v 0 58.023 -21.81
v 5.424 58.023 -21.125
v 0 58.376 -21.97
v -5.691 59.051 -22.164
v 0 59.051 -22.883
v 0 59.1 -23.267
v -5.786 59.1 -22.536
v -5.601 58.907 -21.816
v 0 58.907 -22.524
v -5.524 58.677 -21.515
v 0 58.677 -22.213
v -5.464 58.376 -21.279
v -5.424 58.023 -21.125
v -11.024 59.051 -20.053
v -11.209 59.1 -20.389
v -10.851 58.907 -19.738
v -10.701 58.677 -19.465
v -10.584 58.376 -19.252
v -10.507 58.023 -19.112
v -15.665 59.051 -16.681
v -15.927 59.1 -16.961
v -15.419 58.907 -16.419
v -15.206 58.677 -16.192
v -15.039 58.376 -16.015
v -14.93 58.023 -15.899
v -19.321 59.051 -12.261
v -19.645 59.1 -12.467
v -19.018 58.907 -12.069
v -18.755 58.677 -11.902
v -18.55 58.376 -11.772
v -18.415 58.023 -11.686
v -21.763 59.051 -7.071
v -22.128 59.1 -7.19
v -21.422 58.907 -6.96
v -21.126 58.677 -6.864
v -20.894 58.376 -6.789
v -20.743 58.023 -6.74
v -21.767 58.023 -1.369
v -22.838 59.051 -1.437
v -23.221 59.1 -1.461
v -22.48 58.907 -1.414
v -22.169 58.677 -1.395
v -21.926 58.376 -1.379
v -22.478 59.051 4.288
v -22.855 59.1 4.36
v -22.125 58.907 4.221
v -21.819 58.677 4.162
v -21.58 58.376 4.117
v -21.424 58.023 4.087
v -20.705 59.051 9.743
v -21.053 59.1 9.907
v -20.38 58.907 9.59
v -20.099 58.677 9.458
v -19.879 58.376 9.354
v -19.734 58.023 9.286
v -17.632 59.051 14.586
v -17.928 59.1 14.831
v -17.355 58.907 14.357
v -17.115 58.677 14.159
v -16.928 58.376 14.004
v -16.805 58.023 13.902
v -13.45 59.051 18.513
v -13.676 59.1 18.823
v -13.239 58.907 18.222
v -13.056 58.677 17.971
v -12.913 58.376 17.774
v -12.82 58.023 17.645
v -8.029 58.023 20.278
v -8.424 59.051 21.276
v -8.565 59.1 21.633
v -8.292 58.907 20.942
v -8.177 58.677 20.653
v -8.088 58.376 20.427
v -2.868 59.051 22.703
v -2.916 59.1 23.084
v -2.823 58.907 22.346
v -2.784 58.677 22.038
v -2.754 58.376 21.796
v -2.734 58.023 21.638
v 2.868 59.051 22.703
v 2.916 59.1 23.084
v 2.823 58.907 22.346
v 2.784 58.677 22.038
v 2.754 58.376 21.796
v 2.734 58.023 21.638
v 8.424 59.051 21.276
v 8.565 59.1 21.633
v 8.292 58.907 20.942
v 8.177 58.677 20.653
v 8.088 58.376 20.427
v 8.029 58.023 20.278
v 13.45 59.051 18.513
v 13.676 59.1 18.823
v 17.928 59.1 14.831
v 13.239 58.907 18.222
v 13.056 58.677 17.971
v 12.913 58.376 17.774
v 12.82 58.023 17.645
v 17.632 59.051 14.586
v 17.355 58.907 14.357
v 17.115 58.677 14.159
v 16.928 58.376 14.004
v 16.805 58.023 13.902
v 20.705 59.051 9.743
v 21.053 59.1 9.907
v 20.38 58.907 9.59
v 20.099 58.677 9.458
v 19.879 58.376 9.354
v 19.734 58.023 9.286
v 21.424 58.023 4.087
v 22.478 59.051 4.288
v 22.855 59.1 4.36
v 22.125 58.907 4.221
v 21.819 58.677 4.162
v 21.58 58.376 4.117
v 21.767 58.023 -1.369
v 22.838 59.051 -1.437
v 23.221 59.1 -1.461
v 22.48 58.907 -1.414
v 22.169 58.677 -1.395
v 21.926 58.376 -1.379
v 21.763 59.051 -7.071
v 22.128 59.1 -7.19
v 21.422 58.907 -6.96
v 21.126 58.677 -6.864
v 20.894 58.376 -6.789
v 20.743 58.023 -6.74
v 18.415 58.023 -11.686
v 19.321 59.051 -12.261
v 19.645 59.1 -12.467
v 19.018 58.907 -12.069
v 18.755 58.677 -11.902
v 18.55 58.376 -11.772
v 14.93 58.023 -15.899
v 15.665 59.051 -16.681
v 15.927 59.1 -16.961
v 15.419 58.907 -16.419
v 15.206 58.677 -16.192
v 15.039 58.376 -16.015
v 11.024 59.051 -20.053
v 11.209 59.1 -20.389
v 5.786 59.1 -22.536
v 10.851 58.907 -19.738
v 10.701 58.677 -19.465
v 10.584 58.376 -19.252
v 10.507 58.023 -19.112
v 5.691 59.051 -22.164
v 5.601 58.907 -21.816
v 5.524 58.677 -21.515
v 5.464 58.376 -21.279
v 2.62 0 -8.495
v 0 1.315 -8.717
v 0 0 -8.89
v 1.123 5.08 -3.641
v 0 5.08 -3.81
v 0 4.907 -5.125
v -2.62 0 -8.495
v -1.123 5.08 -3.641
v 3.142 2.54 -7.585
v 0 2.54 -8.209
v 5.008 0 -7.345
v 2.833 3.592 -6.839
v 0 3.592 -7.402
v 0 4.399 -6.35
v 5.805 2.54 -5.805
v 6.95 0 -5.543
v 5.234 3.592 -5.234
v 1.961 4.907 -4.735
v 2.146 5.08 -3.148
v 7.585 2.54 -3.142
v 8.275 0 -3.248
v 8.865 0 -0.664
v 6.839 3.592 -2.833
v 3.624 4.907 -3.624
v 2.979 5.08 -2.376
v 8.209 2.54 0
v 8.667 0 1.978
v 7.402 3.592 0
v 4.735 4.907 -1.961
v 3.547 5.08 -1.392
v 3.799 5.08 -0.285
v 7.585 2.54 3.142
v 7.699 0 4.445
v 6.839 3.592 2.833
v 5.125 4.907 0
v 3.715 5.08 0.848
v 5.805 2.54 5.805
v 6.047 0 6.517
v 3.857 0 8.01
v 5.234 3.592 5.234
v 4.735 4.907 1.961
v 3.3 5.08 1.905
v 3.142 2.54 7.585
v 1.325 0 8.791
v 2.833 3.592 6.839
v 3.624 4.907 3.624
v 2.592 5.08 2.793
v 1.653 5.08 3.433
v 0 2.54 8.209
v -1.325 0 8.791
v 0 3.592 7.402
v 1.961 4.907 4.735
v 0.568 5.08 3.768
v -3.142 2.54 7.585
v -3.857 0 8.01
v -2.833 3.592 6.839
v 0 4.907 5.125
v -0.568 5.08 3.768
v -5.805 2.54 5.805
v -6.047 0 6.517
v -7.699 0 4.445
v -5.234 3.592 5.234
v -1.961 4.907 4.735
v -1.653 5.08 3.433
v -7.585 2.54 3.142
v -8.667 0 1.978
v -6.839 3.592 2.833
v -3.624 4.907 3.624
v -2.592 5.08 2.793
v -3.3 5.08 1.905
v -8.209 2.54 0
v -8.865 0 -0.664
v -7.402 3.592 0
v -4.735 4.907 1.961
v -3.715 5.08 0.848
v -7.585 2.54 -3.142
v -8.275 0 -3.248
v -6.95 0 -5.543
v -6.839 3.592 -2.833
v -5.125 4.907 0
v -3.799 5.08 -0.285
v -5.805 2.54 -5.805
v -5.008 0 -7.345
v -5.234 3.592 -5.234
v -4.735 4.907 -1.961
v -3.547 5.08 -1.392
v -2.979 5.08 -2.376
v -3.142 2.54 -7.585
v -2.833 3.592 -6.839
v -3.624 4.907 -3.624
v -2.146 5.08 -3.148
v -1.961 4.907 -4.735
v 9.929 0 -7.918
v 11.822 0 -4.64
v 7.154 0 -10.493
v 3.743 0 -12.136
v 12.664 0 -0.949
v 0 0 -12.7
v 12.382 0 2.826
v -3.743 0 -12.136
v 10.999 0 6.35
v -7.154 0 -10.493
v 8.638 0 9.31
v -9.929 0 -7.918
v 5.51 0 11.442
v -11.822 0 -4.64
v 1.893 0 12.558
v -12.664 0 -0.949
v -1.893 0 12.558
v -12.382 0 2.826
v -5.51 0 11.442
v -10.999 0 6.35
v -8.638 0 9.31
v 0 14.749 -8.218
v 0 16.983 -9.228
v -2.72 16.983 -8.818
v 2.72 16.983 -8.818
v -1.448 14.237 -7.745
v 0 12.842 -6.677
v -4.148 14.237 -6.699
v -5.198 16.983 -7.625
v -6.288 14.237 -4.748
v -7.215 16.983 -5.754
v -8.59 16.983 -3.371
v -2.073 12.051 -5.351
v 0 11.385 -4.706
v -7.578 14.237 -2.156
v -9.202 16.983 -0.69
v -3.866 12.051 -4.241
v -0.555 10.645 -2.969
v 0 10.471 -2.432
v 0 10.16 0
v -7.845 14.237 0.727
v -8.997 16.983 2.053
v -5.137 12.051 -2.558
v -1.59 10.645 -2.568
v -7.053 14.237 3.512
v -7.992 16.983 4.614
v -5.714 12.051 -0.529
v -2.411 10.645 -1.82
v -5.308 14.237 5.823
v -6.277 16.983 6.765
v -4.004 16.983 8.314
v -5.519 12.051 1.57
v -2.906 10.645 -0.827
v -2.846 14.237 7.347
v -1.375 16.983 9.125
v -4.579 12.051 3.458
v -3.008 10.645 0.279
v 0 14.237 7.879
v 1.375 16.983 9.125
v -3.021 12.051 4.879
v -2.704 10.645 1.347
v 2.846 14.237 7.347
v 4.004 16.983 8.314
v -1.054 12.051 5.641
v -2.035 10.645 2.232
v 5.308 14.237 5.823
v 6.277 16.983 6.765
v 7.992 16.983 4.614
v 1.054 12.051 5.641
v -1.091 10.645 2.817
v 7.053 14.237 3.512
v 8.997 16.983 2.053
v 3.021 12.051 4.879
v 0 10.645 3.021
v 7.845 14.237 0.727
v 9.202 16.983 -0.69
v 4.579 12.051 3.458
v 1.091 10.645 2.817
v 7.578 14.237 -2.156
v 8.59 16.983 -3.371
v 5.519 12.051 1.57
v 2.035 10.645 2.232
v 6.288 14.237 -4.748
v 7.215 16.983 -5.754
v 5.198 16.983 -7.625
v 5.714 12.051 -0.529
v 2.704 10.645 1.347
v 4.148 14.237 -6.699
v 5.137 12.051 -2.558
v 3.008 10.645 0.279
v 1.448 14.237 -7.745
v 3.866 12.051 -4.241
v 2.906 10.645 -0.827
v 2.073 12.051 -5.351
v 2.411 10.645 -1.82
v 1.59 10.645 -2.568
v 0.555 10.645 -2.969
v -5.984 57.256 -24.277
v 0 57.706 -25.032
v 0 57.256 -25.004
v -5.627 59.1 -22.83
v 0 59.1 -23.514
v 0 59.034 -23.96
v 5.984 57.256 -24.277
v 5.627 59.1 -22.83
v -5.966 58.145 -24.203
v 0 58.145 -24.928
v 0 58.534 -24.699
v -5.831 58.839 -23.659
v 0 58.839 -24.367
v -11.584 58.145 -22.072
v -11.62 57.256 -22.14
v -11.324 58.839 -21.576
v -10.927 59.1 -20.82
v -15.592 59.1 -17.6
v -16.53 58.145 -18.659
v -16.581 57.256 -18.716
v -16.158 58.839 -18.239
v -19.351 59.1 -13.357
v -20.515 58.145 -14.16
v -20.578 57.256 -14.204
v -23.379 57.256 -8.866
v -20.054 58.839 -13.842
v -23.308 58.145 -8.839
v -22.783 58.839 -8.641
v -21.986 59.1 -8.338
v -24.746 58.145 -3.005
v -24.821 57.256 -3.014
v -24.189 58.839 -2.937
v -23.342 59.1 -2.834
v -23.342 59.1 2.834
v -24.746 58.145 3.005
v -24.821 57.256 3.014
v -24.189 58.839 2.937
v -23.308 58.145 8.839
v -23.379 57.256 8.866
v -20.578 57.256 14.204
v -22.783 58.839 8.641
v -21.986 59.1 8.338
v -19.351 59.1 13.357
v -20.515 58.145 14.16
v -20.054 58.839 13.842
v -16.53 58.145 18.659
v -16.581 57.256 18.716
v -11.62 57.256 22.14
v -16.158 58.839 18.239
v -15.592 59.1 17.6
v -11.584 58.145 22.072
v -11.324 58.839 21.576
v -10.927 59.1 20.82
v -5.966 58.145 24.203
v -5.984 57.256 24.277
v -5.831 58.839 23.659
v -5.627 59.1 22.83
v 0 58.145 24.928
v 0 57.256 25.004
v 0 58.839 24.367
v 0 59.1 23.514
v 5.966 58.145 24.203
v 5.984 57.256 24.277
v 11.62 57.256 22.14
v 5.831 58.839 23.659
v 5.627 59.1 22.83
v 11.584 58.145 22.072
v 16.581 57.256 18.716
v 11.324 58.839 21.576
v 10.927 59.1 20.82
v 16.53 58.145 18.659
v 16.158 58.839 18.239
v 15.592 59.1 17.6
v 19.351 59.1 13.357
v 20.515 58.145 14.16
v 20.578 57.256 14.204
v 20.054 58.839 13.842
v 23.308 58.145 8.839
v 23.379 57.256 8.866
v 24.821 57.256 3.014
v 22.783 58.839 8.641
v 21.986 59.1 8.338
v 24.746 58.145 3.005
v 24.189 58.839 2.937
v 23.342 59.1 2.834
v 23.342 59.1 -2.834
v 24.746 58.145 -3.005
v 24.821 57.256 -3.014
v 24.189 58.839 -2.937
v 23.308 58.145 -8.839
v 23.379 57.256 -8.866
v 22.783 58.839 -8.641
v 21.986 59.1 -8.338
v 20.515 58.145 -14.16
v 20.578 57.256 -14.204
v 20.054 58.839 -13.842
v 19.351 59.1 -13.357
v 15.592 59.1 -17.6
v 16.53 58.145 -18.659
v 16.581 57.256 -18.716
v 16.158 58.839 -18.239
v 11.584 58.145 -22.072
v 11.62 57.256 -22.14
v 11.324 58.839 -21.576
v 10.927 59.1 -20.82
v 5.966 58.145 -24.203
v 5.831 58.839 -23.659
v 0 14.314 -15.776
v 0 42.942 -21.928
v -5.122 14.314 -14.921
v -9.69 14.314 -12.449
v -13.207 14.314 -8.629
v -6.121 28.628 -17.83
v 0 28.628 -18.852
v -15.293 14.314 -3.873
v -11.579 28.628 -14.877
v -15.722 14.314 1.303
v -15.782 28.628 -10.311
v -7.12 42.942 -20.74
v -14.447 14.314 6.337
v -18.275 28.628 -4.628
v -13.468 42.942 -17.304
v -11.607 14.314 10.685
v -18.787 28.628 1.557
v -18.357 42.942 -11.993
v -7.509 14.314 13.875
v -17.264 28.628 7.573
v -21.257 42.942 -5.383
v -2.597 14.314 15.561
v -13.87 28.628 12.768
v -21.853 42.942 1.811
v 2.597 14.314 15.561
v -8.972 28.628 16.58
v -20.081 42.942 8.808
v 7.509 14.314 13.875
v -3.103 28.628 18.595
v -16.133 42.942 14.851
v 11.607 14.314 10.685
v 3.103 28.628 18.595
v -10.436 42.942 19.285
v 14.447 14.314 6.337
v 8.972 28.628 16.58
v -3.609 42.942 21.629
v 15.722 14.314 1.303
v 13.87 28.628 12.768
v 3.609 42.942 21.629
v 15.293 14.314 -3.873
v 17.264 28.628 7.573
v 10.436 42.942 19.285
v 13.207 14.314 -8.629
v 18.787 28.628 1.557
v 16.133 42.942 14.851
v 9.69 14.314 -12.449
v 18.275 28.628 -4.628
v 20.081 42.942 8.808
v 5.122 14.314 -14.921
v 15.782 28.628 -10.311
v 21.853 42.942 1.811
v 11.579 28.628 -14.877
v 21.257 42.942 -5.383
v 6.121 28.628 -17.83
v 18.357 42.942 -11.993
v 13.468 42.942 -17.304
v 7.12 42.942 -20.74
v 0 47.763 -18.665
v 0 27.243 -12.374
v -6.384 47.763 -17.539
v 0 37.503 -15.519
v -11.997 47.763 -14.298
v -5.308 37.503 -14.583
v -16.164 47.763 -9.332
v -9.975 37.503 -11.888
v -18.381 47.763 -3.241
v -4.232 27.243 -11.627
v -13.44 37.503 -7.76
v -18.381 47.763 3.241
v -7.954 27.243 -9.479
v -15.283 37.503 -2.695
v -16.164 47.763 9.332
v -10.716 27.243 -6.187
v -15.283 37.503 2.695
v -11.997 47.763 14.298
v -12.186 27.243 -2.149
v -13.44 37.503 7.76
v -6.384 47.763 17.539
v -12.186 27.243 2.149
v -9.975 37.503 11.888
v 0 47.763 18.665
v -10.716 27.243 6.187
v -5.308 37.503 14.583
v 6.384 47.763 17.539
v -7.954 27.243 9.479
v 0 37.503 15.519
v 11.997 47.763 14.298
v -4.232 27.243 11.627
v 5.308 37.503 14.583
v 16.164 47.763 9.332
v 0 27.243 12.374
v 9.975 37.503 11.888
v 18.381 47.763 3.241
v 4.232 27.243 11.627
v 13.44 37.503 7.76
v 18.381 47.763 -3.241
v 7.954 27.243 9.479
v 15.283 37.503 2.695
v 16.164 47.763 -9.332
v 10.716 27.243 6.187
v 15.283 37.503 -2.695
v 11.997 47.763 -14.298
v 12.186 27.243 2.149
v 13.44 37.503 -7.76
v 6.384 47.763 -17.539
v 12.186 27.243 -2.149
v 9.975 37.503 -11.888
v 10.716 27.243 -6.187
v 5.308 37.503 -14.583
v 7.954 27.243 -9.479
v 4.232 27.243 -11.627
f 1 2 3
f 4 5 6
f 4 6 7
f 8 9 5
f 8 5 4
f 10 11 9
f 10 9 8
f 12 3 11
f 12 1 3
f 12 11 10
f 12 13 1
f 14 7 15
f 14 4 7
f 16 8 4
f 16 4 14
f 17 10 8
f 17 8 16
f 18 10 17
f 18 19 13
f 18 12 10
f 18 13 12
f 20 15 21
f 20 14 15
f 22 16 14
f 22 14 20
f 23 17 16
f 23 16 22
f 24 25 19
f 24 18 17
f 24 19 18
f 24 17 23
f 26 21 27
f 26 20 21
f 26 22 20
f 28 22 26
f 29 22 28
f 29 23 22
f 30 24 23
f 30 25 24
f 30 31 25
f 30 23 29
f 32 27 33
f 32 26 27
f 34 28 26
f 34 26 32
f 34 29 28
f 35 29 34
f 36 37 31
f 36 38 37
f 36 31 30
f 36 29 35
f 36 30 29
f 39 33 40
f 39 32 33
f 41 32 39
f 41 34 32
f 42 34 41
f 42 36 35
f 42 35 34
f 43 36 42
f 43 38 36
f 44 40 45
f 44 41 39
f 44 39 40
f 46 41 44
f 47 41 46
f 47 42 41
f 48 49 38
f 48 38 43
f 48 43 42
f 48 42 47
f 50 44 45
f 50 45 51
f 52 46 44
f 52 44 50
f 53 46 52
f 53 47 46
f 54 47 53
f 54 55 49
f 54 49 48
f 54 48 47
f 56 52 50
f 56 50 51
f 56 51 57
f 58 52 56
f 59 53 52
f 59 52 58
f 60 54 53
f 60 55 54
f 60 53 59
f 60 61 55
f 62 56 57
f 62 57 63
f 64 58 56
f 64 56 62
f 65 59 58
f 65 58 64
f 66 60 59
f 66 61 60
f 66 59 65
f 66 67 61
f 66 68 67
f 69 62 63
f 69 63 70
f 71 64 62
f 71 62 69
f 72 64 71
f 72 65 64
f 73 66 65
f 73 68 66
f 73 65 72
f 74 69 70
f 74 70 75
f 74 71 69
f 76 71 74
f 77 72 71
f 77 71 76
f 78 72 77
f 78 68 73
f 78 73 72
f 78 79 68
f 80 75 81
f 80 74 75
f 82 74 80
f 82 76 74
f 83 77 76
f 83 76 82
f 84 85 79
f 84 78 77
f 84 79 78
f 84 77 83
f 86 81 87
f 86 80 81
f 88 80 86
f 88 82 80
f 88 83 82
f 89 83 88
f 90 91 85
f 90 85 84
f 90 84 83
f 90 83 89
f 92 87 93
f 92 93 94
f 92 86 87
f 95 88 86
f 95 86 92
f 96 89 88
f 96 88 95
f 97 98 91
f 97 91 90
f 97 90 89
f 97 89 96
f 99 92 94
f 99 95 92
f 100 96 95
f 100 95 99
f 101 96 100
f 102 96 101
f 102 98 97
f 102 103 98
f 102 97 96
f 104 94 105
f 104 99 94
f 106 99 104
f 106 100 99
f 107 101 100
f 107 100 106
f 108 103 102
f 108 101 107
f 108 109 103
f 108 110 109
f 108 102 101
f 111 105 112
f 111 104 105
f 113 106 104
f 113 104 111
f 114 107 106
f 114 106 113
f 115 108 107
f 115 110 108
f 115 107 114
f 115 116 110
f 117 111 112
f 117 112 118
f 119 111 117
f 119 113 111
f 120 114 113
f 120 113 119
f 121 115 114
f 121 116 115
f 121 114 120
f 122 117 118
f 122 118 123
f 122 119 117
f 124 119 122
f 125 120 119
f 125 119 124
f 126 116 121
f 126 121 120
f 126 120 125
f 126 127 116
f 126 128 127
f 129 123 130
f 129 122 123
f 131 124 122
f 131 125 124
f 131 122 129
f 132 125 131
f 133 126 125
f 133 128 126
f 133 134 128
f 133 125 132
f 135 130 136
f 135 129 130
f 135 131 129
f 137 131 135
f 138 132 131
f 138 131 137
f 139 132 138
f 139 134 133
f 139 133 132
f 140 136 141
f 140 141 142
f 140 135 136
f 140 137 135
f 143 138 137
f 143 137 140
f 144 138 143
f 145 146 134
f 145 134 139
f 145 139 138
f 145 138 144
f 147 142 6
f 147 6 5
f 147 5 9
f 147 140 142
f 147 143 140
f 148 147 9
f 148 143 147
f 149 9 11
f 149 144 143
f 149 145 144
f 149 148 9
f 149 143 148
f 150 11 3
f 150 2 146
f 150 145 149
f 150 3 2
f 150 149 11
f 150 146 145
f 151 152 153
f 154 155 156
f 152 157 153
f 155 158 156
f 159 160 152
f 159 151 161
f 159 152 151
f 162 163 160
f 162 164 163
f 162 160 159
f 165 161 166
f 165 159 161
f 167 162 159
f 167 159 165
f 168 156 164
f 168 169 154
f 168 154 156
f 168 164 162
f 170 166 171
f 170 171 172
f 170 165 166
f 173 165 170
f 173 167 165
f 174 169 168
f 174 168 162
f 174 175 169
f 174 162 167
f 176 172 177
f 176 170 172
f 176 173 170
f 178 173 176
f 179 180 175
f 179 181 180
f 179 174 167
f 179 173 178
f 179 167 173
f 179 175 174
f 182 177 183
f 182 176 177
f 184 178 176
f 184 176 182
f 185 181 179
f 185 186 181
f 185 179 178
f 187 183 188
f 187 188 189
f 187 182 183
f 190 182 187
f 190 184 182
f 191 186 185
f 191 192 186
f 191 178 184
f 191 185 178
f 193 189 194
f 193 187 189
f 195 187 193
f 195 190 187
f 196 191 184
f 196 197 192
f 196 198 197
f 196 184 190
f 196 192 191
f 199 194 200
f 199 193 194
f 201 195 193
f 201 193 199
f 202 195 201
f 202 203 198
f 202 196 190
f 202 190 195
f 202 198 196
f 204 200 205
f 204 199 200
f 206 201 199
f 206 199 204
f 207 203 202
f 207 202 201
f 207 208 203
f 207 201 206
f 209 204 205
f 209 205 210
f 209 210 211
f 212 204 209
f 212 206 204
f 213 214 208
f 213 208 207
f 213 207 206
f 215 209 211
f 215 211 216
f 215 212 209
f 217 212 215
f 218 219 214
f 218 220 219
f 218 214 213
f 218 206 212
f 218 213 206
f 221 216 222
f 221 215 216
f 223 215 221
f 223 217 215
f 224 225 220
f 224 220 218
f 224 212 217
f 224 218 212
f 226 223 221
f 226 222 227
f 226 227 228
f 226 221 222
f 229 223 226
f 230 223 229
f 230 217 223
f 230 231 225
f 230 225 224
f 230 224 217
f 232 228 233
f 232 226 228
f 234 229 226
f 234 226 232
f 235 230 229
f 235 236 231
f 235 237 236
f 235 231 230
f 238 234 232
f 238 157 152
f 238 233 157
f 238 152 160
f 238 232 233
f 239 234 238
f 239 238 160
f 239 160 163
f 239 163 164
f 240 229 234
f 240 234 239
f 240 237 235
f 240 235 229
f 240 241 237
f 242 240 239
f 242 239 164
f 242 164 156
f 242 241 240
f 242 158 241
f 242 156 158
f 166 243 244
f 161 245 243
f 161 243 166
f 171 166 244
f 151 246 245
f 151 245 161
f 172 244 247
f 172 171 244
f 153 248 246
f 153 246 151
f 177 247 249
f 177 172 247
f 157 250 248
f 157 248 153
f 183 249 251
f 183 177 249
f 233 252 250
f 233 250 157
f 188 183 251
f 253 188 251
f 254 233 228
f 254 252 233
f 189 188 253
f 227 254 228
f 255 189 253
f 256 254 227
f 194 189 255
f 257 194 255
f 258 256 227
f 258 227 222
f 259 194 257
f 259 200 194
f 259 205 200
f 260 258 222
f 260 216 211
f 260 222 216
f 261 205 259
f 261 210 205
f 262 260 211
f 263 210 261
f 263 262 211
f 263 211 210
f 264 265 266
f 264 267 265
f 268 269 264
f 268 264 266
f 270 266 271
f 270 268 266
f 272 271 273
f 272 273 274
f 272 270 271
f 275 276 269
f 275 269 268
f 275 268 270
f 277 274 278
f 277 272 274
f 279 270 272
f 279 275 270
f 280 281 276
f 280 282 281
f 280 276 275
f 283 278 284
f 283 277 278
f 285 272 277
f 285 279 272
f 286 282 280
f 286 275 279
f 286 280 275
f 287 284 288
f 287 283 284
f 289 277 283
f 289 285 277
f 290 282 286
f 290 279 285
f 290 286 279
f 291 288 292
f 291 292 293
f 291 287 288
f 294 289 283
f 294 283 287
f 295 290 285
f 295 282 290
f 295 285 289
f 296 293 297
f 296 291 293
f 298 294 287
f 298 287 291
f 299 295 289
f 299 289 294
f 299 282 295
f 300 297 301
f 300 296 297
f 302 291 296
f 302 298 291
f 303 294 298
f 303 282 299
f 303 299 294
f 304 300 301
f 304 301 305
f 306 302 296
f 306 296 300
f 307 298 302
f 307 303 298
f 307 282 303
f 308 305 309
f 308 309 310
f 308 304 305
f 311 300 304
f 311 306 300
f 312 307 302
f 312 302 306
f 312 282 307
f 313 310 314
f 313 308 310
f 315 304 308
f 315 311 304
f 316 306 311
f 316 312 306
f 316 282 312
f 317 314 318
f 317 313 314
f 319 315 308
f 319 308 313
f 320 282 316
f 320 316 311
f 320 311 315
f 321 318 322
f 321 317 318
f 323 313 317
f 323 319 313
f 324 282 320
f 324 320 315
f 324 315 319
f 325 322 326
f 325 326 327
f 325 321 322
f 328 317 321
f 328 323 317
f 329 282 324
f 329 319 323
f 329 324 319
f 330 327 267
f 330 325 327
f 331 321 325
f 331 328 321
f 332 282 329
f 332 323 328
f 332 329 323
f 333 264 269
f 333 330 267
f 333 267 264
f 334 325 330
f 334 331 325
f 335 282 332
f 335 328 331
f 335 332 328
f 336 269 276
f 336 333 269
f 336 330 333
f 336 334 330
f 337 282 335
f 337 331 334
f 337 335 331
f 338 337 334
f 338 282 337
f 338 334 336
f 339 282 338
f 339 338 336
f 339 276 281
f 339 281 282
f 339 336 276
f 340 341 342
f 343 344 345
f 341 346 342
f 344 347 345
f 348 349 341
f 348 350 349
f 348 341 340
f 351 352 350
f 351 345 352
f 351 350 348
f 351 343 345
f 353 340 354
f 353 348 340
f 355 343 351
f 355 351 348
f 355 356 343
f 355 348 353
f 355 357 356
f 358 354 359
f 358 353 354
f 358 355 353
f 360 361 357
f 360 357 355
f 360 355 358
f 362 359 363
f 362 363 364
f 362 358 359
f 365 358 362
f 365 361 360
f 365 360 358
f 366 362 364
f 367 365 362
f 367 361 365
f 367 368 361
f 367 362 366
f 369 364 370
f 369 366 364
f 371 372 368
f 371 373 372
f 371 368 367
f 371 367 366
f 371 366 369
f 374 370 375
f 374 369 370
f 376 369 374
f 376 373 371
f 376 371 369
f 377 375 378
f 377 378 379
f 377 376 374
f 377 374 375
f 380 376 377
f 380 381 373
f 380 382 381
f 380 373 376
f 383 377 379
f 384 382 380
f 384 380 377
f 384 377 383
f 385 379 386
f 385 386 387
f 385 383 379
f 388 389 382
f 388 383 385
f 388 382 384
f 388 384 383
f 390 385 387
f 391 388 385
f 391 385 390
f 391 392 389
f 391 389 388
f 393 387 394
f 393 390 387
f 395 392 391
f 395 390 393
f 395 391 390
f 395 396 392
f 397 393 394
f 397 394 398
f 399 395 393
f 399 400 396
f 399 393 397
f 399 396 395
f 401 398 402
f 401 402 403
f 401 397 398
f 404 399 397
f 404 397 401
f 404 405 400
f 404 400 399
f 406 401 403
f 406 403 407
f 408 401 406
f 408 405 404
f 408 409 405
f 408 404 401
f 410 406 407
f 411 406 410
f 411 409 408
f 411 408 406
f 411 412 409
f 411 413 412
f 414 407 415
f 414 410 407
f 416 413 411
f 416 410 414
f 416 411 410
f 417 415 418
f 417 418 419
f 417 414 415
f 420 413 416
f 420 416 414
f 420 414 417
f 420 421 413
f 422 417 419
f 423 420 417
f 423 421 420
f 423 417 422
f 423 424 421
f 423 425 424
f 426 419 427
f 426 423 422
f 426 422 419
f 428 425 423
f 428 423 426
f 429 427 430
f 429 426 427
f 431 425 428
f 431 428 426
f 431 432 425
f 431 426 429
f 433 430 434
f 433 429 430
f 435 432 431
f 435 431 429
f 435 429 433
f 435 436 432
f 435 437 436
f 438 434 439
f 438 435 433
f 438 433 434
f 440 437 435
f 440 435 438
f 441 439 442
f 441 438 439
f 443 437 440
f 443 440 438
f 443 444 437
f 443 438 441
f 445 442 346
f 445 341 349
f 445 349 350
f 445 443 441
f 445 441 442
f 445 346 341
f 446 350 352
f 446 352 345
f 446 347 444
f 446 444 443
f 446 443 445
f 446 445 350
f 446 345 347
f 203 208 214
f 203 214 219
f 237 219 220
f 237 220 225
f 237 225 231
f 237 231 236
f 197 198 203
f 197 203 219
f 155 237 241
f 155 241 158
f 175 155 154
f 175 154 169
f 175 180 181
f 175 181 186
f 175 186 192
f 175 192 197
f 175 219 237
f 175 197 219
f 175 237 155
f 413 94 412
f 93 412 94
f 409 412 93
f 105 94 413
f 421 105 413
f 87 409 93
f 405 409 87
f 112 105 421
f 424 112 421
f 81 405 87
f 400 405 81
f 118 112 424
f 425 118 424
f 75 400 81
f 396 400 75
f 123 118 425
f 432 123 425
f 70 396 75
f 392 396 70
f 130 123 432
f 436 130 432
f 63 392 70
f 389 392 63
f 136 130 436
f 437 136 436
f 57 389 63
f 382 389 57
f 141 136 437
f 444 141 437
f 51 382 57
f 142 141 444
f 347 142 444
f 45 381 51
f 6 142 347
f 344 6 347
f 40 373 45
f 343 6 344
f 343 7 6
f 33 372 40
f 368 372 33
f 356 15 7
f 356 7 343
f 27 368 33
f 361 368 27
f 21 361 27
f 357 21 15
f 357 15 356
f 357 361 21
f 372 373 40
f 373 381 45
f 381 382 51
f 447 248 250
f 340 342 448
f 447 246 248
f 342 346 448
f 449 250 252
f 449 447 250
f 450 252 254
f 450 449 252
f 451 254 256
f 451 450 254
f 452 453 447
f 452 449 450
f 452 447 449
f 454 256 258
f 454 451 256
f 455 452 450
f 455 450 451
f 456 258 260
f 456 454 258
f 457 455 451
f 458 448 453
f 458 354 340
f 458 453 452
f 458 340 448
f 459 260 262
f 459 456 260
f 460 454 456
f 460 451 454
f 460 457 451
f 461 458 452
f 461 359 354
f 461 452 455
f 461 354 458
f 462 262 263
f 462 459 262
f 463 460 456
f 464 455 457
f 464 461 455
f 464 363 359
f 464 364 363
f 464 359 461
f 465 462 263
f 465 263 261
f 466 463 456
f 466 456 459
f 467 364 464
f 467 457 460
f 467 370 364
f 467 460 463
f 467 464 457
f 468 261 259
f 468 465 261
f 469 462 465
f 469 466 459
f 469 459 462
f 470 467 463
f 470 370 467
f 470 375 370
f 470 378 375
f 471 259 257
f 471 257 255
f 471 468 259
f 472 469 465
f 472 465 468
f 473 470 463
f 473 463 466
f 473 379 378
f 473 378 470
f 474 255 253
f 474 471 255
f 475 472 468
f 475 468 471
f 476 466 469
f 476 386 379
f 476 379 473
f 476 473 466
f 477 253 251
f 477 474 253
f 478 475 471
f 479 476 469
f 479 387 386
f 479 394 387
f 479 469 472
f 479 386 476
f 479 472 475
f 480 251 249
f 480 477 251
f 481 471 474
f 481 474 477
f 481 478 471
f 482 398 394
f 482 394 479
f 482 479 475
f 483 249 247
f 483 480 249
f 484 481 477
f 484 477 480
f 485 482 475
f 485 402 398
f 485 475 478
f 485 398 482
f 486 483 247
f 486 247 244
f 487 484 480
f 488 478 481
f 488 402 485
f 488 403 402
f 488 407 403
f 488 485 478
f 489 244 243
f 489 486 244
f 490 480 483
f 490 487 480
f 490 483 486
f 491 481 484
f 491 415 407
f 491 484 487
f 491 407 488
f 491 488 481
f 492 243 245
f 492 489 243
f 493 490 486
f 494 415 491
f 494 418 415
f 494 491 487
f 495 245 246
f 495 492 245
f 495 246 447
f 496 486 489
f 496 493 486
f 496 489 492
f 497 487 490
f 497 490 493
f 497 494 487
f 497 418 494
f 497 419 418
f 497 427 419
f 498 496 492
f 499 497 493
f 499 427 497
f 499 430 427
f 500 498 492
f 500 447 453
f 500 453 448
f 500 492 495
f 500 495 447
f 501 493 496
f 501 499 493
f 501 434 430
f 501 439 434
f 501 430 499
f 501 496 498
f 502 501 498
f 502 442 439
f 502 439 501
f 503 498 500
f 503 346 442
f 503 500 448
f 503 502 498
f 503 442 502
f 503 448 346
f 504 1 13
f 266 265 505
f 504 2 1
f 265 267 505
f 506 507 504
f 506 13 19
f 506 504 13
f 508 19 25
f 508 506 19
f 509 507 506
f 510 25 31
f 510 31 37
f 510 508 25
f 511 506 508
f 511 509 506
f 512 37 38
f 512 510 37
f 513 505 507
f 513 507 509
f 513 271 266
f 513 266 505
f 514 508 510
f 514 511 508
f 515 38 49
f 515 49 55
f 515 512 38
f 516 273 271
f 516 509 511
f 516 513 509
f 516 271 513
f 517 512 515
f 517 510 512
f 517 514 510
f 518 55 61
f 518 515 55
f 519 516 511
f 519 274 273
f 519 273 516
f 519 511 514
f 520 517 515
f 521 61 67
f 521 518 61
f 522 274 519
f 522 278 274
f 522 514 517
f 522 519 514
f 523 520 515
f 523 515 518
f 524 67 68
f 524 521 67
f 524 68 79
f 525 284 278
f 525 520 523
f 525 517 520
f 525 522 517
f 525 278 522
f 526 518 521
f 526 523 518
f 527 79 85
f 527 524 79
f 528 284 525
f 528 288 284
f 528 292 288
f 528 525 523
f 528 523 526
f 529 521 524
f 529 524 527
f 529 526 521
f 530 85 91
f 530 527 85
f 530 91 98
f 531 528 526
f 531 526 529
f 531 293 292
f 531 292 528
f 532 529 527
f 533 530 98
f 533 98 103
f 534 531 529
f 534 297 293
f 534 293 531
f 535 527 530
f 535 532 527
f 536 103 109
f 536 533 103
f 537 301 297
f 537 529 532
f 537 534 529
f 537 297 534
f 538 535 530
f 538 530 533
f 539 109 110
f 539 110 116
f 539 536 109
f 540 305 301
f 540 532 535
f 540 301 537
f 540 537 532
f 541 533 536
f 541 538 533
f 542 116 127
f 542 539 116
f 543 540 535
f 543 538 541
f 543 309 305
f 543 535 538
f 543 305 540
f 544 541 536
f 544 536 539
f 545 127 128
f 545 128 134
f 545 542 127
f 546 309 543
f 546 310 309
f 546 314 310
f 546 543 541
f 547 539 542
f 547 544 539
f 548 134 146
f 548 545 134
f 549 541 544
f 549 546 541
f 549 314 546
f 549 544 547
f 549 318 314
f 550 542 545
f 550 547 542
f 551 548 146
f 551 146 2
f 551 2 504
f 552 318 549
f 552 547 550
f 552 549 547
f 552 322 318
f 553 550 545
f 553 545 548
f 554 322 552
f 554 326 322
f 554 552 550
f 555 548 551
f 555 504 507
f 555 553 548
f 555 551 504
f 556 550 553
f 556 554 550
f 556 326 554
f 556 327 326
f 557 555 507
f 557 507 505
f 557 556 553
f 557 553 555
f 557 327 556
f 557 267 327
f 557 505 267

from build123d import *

# Parameters (mm, degrees)
FILLET1_R          = 1.524
SKETCH4_R          = 8.89
CUT_EXTRUDE1_DEPTH = 5.08
FILLET2_R          = 5.08


with BuildPart() as part:
    # Sketch3 → Revolve1 (revolve)
    with BuildSketch(Plane.XY, mode=Mode.PRIVATE) as revolve1_sk:
        with BuildLine():
            Line((0, 0), (12.7, 0))
            Line((12.7, 0), (25.4, 59.10038719))
            Line((25.4, 59.10038719), (22.140333333, 59.10038719))
            Line((22.140333333, 59.10038719), (9.228066554, 16.982885))
            ThreePointArc((9.228066554, 16.982885), (5.738226469, 12.050952327), (0, 10.16))
            Line((0, 10.16), (0, 0))
        make_face()
    revolve(revolve1_sk.sketch.rotate(Axis((0, 0, 0), (0, 1, 0)), 90), axis=Axis((0, 0, 0), (0, 1, 0)))

    # Fillet1
    fillet1_edges = [part.edges().sort_by_distance(p)[0] for p in [
        (0, 59.10038719, 25.4),
        (0, 59.10038719, 22.140333333),
    ]]
    fillet(fillet1_edges, radius=FILLET1_R)

    # Sketch4 → Cut-Extrude1 (cut)
    with BuildSketch(Plane.XZ):
        with Locations(Location((0, 0, 0), (0, 0, 270))):
            Circle(SKETCH4_R)
    extrude(amount=-CUT_EXTRUDE1_DEPTH, mode=Mode.SUBTRACT)

    # Fillet2
    fillet2_edges = [part.edges().sort_by_distance(p)[0] for p in [
        (0, 5.08, 8.89),
    ]]
    fillet(fillet2_edges, radius=FILLET2_R - 0.0001)  # a hair under: the kernel refuses the full size


solid = part.part
